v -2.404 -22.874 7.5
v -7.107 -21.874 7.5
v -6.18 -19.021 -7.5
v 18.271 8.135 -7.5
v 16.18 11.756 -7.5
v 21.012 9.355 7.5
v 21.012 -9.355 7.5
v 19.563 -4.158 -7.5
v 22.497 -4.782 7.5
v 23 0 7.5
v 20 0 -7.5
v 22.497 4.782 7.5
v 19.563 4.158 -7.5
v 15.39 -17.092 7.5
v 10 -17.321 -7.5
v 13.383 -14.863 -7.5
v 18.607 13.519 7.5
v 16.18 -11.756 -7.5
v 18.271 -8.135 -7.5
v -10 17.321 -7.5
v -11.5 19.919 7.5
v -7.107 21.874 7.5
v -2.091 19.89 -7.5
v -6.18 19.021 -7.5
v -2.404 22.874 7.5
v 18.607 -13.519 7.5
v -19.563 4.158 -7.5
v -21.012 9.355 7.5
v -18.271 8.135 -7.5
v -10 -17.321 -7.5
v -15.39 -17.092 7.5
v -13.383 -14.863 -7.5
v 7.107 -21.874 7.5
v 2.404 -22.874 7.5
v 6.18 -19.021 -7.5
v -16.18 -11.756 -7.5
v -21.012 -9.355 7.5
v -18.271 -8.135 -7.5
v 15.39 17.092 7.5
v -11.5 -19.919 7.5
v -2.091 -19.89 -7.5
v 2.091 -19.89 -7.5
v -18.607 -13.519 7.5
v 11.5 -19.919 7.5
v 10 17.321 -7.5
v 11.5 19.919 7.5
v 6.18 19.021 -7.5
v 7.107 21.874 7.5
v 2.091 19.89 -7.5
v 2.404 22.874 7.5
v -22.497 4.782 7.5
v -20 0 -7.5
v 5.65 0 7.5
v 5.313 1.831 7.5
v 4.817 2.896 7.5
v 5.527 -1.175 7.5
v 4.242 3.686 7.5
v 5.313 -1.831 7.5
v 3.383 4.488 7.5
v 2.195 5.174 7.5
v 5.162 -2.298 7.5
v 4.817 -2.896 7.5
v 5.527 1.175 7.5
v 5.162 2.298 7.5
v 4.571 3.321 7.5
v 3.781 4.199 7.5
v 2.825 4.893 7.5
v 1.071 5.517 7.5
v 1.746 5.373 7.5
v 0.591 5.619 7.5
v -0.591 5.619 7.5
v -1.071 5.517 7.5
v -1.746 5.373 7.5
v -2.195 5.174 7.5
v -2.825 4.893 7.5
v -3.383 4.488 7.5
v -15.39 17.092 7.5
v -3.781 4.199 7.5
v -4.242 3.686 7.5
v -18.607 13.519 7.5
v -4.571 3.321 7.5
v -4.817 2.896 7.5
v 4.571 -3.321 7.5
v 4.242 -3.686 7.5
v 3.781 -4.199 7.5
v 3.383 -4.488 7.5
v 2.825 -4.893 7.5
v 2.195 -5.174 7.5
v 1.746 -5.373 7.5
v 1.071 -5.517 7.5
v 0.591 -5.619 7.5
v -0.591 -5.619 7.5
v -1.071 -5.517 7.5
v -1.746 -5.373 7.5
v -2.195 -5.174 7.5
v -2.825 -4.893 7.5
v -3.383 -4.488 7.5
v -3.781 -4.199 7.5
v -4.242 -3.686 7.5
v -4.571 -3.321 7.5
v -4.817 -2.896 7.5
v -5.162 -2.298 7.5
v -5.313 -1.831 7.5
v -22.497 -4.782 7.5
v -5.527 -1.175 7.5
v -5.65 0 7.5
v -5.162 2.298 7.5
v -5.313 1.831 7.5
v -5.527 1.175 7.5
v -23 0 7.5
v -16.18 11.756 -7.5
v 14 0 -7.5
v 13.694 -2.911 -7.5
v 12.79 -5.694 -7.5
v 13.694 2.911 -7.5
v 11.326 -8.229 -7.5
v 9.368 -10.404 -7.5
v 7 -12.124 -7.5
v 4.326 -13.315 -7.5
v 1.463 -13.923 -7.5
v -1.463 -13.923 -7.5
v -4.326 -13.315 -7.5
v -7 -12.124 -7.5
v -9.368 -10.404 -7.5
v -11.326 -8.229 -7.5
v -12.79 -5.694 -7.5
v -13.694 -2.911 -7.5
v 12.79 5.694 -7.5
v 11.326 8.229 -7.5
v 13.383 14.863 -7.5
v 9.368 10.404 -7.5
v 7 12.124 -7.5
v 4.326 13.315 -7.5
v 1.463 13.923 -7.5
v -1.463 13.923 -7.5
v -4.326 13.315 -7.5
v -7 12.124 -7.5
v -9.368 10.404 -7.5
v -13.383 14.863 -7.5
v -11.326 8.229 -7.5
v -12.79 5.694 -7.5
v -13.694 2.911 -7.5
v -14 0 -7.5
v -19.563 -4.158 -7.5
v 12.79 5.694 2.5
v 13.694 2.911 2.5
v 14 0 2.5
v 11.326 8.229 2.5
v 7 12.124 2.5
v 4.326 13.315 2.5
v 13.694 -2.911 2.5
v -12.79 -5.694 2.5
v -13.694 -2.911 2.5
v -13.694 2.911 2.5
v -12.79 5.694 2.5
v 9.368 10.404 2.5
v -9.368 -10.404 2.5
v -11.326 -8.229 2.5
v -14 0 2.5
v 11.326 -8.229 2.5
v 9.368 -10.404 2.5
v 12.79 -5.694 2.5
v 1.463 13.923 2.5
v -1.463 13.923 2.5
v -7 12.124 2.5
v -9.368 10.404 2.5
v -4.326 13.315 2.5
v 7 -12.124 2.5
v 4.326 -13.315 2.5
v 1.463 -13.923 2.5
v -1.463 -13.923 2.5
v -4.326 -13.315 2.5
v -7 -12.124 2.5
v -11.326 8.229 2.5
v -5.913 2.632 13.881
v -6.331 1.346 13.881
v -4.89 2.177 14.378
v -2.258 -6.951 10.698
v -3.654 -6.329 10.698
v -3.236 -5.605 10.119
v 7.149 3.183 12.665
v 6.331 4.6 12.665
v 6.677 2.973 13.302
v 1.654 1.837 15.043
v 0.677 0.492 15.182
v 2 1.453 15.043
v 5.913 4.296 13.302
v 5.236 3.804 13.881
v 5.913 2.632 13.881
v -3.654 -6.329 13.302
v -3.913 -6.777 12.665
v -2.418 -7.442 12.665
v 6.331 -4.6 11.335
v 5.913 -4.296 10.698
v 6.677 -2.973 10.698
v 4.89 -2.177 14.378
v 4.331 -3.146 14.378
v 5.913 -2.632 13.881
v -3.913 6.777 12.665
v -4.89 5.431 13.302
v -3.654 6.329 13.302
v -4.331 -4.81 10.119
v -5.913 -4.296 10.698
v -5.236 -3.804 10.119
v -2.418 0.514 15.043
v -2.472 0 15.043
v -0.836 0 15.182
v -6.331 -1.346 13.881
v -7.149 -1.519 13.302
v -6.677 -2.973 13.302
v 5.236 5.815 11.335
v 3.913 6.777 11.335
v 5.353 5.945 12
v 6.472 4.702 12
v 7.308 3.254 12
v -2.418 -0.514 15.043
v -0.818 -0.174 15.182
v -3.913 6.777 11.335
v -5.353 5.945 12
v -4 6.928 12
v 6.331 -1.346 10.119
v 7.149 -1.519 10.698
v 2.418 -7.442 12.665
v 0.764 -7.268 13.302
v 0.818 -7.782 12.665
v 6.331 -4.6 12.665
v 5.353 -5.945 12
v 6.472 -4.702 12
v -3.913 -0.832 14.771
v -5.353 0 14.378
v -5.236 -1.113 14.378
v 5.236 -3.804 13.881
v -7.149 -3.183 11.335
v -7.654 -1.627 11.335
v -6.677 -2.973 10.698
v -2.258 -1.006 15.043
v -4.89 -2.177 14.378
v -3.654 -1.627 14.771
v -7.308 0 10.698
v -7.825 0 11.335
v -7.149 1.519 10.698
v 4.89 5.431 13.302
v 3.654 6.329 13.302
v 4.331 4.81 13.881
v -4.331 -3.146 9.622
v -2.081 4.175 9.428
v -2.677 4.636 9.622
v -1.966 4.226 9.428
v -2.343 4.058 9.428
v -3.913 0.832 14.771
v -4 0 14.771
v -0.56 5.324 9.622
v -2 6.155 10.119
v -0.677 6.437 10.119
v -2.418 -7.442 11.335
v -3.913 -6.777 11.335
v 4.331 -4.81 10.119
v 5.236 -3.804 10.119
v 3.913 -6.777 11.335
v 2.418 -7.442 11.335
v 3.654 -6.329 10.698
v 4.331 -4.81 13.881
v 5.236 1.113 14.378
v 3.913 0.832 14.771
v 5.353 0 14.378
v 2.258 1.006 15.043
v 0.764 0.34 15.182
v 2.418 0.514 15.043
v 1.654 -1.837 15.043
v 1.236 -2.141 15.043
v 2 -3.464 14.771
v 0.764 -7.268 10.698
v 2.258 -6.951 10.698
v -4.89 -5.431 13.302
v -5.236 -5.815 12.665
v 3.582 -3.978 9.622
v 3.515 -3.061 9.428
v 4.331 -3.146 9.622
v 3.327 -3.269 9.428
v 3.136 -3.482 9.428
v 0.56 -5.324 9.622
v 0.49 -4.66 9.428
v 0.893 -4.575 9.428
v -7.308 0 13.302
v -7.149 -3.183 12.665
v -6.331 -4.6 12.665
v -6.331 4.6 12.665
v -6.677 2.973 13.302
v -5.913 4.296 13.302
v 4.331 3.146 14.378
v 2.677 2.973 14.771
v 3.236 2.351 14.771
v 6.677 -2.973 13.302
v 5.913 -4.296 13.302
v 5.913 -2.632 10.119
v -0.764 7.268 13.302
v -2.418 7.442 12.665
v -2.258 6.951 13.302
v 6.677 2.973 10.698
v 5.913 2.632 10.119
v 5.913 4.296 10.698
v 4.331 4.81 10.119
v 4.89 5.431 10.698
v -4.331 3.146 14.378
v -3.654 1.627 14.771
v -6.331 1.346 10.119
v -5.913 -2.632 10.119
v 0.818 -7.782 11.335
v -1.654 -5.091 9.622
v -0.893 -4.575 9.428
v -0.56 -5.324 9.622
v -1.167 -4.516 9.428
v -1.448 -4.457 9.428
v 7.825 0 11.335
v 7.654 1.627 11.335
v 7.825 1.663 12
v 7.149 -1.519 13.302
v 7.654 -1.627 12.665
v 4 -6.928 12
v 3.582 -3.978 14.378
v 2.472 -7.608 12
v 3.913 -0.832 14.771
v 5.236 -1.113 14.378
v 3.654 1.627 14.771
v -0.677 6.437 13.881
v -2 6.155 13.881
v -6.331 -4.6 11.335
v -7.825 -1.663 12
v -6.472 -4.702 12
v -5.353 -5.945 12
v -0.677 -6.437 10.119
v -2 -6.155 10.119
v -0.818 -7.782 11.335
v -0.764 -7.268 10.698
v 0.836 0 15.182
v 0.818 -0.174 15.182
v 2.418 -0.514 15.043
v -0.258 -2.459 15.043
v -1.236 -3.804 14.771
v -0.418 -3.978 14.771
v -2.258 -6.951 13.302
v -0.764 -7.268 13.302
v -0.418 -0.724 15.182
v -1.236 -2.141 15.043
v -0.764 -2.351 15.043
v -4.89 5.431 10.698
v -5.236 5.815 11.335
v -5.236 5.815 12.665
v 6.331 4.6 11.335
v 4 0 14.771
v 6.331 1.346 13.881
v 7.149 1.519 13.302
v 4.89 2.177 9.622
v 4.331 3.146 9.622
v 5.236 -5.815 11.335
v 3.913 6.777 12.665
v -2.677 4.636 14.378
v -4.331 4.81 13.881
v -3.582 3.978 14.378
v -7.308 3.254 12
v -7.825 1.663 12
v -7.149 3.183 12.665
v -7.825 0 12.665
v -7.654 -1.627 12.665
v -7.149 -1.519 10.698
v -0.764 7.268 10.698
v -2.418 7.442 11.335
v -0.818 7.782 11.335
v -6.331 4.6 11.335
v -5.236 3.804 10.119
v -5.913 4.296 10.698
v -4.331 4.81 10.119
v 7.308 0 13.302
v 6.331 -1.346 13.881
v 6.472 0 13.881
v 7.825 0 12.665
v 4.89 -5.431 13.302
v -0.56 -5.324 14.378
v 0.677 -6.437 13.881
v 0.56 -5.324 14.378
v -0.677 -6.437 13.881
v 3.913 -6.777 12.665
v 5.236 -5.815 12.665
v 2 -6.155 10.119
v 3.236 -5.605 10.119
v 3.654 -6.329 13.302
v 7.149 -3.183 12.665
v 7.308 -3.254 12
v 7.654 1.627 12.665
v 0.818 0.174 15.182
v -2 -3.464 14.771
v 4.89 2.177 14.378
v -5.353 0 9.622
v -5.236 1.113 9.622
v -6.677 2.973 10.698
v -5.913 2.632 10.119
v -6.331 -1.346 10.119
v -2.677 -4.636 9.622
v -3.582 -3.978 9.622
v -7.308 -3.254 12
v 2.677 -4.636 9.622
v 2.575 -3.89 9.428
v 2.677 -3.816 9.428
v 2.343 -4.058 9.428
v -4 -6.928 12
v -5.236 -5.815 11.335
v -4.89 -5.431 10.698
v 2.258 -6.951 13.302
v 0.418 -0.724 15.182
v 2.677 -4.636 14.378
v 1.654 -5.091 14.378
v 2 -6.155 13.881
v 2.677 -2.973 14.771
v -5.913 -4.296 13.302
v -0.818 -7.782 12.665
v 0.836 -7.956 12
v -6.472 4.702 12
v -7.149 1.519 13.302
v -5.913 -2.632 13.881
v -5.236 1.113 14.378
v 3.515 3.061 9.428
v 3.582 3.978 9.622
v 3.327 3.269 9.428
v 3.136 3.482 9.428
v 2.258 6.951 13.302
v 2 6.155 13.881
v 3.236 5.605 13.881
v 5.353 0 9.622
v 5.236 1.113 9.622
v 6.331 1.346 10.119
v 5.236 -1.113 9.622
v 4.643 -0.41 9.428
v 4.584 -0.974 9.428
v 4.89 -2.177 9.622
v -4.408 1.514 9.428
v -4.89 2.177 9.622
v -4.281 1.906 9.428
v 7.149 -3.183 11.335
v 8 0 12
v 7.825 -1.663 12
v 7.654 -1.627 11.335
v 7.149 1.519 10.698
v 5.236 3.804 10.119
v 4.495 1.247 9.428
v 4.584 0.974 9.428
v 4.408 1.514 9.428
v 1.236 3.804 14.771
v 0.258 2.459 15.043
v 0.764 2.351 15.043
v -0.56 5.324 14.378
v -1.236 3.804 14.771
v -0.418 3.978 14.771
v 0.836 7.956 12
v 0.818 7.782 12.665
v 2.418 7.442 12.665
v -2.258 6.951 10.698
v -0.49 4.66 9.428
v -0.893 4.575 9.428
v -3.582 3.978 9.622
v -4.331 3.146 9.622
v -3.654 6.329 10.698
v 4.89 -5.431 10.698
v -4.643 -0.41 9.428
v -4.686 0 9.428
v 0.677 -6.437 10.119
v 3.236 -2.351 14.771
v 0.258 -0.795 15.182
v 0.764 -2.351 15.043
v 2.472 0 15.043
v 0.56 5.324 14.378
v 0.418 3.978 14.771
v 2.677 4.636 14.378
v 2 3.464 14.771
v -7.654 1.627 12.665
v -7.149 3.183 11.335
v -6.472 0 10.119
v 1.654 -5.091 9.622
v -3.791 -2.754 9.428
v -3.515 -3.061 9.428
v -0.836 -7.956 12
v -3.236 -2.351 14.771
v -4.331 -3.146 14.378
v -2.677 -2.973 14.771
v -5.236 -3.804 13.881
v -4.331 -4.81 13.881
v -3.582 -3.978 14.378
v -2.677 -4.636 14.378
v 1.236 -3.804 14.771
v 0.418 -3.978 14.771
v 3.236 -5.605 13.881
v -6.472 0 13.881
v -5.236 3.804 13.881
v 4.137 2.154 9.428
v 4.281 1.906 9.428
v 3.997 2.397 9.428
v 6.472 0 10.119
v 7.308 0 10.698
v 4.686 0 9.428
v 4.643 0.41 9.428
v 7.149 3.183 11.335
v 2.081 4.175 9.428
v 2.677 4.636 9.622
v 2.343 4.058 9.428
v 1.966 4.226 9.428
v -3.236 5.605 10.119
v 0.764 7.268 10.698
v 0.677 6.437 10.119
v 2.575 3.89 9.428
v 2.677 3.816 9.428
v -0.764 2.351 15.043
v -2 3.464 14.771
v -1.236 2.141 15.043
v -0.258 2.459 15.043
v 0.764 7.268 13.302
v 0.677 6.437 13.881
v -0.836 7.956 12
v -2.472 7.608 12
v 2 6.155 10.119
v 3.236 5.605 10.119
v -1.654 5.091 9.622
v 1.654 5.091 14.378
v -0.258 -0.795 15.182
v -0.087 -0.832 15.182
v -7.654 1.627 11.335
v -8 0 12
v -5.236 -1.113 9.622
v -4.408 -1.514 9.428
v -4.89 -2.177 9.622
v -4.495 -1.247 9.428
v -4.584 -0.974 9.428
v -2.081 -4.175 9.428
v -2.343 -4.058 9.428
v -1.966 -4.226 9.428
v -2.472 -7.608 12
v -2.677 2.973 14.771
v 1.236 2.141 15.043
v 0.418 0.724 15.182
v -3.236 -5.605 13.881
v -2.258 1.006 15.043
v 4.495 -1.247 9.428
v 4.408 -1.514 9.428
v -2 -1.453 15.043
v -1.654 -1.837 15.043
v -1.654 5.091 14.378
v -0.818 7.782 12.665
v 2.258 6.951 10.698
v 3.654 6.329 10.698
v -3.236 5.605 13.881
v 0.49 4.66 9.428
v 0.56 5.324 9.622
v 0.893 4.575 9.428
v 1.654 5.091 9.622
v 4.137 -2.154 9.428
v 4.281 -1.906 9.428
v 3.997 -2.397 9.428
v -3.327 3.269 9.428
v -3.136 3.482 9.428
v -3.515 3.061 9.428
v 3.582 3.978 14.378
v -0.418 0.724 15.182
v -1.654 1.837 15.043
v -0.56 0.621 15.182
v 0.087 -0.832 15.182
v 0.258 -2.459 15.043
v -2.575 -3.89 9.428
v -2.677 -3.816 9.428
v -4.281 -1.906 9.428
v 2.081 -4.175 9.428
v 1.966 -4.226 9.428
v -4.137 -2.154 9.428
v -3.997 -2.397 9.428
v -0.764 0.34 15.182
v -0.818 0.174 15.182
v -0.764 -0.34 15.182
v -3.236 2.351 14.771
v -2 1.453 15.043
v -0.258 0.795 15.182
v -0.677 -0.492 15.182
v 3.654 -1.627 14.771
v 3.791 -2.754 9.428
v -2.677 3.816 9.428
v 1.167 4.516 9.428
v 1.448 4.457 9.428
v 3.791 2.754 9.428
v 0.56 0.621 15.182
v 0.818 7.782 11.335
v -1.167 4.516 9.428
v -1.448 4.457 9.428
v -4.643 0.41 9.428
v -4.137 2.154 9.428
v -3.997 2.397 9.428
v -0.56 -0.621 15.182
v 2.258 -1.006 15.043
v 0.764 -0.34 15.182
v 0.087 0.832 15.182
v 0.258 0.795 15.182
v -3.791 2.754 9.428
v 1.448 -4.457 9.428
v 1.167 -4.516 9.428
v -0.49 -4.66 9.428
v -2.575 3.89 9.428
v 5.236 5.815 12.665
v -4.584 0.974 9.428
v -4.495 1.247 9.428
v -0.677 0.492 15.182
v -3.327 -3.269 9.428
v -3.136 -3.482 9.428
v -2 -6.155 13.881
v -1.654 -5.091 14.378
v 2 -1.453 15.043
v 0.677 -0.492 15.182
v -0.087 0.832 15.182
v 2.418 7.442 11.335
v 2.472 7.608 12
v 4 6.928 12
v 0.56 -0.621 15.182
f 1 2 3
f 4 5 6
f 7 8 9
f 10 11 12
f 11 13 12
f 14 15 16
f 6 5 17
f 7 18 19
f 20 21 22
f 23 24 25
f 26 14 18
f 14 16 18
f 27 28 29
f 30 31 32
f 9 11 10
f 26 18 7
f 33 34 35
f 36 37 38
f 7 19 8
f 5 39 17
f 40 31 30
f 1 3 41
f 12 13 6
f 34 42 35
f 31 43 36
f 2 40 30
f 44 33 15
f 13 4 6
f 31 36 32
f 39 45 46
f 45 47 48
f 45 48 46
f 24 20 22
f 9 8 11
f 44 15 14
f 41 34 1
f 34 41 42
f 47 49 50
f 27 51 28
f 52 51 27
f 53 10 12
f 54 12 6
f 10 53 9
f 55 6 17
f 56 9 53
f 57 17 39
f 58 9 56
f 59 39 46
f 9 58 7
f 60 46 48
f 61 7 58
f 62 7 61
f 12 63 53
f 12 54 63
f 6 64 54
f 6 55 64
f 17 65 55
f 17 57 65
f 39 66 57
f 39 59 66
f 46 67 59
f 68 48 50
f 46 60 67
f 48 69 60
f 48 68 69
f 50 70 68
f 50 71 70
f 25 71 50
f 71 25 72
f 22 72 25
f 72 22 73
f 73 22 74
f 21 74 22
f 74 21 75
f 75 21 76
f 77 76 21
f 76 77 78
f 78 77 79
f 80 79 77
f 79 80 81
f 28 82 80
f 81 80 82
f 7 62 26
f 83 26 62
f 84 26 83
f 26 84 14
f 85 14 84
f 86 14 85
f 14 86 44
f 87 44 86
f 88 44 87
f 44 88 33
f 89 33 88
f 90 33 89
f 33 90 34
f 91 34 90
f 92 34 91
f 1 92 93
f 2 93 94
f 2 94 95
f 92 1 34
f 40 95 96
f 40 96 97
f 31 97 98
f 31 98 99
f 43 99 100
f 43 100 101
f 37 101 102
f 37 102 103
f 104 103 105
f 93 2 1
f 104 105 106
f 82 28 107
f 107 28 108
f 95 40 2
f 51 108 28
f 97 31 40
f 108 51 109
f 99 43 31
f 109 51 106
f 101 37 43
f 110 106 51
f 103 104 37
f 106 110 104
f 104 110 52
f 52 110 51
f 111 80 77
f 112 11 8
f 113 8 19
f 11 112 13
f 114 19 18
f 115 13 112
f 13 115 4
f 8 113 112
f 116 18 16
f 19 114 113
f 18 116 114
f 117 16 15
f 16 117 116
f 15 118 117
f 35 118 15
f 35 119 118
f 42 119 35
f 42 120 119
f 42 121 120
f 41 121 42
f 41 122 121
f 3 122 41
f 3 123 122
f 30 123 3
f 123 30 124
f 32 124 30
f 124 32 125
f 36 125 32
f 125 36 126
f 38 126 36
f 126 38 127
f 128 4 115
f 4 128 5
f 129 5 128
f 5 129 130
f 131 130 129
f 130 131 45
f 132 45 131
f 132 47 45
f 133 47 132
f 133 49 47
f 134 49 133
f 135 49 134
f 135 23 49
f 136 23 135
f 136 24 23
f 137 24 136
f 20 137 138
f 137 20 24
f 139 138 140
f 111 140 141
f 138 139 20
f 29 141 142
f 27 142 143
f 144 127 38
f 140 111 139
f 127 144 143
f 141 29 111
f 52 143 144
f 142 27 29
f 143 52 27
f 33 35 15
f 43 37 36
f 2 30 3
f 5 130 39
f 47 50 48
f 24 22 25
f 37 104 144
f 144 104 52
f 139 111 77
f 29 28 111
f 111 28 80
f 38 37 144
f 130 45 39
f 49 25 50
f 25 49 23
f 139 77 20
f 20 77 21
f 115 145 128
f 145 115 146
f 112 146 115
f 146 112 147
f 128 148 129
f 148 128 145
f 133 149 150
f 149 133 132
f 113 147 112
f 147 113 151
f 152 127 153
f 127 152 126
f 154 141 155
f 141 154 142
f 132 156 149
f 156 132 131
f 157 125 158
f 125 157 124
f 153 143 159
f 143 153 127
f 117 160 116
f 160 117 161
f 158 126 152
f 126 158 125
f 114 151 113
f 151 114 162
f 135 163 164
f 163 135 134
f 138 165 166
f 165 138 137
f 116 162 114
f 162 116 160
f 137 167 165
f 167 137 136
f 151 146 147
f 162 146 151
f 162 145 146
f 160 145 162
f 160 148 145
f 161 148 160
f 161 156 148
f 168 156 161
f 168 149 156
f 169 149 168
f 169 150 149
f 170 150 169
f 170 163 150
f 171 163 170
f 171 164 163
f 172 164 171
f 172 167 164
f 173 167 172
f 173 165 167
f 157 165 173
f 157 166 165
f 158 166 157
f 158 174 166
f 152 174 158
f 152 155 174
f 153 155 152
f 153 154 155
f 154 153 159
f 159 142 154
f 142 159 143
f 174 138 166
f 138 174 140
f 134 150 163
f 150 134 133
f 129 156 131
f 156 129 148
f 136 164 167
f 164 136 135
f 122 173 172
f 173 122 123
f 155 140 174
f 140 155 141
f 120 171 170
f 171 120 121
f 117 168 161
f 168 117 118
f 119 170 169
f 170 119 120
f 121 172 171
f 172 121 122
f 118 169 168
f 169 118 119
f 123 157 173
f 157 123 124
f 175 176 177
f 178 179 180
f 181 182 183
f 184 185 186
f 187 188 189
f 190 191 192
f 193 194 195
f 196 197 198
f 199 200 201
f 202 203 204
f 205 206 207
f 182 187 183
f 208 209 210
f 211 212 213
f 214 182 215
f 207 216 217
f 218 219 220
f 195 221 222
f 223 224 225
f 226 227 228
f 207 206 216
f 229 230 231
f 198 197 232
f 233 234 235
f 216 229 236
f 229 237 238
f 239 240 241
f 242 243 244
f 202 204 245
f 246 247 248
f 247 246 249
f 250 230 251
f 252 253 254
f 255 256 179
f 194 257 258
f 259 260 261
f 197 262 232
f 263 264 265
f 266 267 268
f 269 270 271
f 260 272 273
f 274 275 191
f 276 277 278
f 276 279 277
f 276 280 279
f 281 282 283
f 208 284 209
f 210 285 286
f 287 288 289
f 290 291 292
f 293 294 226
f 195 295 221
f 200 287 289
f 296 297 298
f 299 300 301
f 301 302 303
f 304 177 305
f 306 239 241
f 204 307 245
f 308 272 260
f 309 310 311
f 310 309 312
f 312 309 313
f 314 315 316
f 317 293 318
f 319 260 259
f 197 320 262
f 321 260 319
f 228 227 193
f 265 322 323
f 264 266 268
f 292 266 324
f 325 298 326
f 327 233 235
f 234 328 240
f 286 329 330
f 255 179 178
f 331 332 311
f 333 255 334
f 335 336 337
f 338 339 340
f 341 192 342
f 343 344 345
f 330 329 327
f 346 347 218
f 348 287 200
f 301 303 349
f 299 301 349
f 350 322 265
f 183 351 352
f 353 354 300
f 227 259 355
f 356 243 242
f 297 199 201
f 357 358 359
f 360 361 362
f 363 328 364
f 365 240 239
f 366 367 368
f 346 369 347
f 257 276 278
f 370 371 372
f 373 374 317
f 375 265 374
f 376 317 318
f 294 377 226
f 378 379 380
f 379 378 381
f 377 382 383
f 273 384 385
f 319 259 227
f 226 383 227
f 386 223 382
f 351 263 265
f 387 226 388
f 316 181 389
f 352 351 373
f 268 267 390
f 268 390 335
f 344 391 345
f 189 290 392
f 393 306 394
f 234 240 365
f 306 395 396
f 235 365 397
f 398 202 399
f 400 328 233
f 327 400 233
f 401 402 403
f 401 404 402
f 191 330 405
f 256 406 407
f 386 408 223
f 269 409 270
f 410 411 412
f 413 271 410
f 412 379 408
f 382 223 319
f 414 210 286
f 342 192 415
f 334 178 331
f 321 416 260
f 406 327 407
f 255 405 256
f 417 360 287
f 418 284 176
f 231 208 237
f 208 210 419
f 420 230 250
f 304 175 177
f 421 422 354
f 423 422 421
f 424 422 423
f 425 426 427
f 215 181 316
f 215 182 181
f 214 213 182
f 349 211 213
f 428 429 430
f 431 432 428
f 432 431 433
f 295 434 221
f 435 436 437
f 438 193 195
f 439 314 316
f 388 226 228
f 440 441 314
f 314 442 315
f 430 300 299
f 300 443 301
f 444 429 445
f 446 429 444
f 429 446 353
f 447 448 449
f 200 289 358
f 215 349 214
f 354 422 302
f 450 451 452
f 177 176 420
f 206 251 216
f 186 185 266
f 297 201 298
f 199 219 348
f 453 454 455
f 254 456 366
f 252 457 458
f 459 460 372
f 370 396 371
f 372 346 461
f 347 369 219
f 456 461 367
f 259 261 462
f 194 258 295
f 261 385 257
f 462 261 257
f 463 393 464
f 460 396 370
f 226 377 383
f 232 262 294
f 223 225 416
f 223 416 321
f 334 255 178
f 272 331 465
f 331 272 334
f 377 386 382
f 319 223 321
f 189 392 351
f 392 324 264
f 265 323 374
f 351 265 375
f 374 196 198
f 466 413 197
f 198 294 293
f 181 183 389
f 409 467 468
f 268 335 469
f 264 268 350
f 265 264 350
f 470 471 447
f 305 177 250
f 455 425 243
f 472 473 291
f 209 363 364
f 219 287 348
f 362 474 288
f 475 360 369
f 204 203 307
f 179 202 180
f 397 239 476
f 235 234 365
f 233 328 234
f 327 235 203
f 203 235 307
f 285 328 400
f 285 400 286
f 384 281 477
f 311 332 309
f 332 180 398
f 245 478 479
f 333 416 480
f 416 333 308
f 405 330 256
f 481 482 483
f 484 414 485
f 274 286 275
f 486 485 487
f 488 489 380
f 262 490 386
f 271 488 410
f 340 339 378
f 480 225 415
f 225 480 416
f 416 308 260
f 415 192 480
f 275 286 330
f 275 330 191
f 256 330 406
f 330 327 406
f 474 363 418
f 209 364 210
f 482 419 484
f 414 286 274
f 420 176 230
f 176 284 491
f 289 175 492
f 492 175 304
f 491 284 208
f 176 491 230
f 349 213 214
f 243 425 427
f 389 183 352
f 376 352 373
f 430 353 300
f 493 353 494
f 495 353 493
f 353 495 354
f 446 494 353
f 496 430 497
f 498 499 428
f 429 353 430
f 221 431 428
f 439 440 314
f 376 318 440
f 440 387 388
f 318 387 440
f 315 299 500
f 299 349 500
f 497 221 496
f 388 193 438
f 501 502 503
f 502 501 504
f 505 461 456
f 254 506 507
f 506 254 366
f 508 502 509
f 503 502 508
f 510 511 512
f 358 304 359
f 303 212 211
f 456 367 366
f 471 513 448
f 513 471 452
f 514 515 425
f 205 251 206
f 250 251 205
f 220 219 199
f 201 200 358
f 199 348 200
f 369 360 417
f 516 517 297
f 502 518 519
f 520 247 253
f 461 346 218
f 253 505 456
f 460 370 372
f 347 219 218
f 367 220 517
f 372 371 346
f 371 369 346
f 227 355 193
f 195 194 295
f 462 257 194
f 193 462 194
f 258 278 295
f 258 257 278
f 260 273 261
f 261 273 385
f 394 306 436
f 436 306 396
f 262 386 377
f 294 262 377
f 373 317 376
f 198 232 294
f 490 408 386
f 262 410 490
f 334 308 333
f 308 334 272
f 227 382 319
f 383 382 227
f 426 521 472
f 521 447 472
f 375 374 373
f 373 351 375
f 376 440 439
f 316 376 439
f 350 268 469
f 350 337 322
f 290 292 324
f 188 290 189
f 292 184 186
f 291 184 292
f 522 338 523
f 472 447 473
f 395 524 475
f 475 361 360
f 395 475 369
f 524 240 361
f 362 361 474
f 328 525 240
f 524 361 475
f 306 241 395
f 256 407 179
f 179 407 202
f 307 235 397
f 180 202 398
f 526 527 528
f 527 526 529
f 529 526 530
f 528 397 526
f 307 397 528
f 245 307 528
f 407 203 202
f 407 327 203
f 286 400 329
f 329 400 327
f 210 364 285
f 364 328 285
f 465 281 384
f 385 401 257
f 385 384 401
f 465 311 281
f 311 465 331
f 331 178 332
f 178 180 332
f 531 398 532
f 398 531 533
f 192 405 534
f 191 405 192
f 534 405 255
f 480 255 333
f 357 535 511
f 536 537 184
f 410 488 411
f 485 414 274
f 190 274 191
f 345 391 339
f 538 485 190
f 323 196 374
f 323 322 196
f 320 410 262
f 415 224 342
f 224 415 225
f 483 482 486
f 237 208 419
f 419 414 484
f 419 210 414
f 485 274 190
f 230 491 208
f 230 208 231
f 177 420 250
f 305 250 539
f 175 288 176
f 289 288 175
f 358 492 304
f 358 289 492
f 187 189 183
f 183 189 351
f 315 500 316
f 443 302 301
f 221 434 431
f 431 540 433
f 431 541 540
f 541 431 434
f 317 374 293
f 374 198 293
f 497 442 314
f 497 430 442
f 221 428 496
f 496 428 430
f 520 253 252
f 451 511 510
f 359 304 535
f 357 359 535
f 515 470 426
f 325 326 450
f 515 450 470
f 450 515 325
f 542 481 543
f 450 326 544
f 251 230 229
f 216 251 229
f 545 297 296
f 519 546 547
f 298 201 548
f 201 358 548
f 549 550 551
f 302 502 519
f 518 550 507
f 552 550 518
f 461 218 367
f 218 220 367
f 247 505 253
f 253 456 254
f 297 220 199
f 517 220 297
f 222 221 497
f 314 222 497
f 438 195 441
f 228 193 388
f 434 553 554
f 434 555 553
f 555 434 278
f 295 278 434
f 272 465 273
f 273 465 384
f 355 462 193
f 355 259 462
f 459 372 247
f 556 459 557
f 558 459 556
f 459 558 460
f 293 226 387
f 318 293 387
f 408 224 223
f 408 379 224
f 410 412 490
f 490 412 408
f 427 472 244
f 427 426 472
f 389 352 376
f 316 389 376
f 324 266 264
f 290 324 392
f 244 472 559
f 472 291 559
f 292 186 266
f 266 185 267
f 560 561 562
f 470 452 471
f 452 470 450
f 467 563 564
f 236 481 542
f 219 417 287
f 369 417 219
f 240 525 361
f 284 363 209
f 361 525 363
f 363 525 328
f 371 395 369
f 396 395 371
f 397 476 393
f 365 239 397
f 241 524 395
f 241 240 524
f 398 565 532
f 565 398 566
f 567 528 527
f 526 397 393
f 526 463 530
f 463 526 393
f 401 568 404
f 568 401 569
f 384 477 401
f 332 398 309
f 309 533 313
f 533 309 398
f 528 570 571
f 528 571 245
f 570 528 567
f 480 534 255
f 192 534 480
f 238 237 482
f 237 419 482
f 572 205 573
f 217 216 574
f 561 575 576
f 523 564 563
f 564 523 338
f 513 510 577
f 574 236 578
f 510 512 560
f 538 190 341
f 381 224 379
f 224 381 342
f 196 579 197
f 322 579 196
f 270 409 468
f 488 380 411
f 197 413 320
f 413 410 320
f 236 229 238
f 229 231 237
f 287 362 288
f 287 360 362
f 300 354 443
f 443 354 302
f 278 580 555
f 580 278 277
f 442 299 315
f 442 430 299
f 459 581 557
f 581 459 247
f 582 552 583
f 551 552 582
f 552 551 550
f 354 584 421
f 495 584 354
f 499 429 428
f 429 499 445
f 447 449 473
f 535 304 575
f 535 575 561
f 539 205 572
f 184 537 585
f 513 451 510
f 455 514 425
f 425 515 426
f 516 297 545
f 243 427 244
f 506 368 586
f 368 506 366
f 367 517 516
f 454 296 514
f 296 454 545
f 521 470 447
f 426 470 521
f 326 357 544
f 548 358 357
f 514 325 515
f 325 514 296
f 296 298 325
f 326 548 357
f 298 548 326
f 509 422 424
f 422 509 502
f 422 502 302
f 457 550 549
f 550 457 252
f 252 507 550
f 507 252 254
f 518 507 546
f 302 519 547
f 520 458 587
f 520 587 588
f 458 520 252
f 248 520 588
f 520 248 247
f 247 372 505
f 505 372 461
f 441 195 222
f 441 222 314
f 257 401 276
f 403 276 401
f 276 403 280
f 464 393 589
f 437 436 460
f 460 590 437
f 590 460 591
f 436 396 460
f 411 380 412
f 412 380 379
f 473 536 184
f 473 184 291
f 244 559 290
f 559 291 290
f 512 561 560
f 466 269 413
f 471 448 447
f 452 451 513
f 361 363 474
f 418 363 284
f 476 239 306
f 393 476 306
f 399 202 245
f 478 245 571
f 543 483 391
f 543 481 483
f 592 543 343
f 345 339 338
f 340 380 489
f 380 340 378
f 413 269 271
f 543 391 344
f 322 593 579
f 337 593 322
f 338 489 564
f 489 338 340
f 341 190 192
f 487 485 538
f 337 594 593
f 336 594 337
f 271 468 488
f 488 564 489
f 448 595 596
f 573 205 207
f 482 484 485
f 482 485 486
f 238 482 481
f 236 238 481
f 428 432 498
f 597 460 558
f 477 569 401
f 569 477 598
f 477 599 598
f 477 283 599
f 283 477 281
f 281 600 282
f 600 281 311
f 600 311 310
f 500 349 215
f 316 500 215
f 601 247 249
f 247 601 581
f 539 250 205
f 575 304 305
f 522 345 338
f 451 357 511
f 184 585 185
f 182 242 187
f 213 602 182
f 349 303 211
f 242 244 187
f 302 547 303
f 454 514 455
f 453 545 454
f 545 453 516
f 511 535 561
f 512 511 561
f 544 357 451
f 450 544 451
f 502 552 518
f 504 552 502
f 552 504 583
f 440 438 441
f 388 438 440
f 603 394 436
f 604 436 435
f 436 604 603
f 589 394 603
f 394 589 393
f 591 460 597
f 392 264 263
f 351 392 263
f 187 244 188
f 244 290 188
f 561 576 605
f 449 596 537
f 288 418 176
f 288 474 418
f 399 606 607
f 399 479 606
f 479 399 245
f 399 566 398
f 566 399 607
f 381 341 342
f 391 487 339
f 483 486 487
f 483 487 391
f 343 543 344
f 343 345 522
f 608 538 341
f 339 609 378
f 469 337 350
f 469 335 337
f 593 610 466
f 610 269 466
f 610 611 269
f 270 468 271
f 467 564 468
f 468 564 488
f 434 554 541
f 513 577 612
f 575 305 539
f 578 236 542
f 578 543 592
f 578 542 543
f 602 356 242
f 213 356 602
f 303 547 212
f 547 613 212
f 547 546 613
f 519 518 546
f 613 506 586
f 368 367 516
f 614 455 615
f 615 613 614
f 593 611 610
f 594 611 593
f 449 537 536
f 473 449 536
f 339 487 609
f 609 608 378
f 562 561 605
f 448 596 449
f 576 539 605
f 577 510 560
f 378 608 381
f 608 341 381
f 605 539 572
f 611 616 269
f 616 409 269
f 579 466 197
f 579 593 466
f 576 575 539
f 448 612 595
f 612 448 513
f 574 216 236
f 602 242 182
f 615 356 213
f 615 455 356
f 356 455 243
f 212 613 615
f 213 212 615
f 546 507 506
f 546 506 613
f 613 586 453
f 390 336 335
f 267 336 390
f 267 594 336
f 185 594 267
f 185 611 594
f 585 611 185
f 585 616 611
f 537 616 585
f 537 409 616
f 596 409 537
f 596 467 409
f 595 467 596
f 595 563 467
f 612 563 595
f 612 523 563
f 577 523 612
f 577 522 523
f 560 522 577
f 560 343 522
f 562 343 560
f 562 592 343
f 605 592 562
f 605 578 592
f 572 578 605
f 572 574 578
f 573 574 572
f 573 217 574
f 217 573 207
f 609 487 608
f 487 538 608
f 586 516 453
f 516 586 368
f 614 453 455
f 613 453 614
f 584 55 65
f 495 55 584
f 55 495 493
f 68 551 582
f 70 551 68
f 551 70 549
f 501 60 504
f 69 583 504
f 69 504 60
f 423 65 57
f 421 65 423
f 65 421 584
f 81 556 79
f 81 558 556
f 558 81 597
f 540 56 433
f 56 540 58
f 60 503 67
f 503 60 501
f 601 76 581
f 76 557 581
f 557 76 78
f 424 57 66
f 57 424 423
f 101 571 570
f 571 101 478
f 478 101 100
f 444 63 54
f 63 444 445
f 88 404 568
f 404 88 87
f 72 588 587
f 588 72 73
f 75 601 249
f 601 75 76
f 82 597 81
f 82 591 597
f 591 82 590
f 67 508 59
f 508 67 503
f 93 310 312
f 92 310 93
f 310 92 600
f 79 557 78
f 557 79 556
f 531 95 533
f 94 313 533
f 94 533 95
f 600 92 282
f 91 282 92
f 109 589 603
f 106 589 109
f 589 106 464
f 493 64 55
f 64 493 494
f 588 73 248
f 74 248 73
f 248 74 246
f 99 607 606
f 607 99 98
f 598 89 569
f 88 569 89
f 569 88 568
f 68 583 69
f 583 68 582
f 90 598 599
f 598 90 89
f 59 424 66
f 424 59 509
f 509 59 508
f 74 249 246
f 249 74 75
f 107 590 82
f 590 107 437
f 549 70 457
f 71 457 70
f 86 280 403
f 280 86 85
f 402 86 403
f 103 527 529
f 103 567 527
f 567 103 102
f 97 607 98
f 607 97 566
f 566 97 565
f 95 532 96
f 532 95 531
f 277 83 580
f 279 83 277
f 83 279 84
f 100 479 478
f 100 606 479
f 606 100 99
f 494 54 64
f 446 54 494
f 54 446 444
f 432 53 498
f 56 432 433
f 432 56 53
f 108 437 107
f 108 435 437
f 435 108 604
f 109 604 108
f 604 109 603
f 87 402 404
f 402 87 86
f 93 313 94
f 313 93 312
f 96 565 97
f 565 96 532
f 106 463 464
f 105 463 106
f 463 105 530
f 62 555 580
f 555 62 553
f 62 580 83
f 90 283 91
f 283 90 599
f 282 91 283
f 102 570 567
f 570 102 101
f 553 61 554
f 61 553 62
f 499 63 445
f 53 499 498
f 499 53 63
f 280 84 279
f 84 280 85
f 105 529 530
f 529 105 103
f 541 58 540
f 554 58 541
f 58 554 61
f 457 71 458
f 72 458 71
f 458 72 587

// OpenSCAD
difference() {
	cylinder(r1=20,r2=23,h=15,center=true);
	translate([0,0,-2.5])
		cylinder(r=14,h=10,center=true);
}

translate([0,0,18]) {
	scale([4,4,4]) {
			translate([0,0,-1.5])
			scale([1.0,1.0,0.4])
			sphere(r=2,$fn=30);

			translate([0,0,-2.8])
			cylinder(r1=2,r2=1,h=2,$fn=30,center=true);
	}
}
